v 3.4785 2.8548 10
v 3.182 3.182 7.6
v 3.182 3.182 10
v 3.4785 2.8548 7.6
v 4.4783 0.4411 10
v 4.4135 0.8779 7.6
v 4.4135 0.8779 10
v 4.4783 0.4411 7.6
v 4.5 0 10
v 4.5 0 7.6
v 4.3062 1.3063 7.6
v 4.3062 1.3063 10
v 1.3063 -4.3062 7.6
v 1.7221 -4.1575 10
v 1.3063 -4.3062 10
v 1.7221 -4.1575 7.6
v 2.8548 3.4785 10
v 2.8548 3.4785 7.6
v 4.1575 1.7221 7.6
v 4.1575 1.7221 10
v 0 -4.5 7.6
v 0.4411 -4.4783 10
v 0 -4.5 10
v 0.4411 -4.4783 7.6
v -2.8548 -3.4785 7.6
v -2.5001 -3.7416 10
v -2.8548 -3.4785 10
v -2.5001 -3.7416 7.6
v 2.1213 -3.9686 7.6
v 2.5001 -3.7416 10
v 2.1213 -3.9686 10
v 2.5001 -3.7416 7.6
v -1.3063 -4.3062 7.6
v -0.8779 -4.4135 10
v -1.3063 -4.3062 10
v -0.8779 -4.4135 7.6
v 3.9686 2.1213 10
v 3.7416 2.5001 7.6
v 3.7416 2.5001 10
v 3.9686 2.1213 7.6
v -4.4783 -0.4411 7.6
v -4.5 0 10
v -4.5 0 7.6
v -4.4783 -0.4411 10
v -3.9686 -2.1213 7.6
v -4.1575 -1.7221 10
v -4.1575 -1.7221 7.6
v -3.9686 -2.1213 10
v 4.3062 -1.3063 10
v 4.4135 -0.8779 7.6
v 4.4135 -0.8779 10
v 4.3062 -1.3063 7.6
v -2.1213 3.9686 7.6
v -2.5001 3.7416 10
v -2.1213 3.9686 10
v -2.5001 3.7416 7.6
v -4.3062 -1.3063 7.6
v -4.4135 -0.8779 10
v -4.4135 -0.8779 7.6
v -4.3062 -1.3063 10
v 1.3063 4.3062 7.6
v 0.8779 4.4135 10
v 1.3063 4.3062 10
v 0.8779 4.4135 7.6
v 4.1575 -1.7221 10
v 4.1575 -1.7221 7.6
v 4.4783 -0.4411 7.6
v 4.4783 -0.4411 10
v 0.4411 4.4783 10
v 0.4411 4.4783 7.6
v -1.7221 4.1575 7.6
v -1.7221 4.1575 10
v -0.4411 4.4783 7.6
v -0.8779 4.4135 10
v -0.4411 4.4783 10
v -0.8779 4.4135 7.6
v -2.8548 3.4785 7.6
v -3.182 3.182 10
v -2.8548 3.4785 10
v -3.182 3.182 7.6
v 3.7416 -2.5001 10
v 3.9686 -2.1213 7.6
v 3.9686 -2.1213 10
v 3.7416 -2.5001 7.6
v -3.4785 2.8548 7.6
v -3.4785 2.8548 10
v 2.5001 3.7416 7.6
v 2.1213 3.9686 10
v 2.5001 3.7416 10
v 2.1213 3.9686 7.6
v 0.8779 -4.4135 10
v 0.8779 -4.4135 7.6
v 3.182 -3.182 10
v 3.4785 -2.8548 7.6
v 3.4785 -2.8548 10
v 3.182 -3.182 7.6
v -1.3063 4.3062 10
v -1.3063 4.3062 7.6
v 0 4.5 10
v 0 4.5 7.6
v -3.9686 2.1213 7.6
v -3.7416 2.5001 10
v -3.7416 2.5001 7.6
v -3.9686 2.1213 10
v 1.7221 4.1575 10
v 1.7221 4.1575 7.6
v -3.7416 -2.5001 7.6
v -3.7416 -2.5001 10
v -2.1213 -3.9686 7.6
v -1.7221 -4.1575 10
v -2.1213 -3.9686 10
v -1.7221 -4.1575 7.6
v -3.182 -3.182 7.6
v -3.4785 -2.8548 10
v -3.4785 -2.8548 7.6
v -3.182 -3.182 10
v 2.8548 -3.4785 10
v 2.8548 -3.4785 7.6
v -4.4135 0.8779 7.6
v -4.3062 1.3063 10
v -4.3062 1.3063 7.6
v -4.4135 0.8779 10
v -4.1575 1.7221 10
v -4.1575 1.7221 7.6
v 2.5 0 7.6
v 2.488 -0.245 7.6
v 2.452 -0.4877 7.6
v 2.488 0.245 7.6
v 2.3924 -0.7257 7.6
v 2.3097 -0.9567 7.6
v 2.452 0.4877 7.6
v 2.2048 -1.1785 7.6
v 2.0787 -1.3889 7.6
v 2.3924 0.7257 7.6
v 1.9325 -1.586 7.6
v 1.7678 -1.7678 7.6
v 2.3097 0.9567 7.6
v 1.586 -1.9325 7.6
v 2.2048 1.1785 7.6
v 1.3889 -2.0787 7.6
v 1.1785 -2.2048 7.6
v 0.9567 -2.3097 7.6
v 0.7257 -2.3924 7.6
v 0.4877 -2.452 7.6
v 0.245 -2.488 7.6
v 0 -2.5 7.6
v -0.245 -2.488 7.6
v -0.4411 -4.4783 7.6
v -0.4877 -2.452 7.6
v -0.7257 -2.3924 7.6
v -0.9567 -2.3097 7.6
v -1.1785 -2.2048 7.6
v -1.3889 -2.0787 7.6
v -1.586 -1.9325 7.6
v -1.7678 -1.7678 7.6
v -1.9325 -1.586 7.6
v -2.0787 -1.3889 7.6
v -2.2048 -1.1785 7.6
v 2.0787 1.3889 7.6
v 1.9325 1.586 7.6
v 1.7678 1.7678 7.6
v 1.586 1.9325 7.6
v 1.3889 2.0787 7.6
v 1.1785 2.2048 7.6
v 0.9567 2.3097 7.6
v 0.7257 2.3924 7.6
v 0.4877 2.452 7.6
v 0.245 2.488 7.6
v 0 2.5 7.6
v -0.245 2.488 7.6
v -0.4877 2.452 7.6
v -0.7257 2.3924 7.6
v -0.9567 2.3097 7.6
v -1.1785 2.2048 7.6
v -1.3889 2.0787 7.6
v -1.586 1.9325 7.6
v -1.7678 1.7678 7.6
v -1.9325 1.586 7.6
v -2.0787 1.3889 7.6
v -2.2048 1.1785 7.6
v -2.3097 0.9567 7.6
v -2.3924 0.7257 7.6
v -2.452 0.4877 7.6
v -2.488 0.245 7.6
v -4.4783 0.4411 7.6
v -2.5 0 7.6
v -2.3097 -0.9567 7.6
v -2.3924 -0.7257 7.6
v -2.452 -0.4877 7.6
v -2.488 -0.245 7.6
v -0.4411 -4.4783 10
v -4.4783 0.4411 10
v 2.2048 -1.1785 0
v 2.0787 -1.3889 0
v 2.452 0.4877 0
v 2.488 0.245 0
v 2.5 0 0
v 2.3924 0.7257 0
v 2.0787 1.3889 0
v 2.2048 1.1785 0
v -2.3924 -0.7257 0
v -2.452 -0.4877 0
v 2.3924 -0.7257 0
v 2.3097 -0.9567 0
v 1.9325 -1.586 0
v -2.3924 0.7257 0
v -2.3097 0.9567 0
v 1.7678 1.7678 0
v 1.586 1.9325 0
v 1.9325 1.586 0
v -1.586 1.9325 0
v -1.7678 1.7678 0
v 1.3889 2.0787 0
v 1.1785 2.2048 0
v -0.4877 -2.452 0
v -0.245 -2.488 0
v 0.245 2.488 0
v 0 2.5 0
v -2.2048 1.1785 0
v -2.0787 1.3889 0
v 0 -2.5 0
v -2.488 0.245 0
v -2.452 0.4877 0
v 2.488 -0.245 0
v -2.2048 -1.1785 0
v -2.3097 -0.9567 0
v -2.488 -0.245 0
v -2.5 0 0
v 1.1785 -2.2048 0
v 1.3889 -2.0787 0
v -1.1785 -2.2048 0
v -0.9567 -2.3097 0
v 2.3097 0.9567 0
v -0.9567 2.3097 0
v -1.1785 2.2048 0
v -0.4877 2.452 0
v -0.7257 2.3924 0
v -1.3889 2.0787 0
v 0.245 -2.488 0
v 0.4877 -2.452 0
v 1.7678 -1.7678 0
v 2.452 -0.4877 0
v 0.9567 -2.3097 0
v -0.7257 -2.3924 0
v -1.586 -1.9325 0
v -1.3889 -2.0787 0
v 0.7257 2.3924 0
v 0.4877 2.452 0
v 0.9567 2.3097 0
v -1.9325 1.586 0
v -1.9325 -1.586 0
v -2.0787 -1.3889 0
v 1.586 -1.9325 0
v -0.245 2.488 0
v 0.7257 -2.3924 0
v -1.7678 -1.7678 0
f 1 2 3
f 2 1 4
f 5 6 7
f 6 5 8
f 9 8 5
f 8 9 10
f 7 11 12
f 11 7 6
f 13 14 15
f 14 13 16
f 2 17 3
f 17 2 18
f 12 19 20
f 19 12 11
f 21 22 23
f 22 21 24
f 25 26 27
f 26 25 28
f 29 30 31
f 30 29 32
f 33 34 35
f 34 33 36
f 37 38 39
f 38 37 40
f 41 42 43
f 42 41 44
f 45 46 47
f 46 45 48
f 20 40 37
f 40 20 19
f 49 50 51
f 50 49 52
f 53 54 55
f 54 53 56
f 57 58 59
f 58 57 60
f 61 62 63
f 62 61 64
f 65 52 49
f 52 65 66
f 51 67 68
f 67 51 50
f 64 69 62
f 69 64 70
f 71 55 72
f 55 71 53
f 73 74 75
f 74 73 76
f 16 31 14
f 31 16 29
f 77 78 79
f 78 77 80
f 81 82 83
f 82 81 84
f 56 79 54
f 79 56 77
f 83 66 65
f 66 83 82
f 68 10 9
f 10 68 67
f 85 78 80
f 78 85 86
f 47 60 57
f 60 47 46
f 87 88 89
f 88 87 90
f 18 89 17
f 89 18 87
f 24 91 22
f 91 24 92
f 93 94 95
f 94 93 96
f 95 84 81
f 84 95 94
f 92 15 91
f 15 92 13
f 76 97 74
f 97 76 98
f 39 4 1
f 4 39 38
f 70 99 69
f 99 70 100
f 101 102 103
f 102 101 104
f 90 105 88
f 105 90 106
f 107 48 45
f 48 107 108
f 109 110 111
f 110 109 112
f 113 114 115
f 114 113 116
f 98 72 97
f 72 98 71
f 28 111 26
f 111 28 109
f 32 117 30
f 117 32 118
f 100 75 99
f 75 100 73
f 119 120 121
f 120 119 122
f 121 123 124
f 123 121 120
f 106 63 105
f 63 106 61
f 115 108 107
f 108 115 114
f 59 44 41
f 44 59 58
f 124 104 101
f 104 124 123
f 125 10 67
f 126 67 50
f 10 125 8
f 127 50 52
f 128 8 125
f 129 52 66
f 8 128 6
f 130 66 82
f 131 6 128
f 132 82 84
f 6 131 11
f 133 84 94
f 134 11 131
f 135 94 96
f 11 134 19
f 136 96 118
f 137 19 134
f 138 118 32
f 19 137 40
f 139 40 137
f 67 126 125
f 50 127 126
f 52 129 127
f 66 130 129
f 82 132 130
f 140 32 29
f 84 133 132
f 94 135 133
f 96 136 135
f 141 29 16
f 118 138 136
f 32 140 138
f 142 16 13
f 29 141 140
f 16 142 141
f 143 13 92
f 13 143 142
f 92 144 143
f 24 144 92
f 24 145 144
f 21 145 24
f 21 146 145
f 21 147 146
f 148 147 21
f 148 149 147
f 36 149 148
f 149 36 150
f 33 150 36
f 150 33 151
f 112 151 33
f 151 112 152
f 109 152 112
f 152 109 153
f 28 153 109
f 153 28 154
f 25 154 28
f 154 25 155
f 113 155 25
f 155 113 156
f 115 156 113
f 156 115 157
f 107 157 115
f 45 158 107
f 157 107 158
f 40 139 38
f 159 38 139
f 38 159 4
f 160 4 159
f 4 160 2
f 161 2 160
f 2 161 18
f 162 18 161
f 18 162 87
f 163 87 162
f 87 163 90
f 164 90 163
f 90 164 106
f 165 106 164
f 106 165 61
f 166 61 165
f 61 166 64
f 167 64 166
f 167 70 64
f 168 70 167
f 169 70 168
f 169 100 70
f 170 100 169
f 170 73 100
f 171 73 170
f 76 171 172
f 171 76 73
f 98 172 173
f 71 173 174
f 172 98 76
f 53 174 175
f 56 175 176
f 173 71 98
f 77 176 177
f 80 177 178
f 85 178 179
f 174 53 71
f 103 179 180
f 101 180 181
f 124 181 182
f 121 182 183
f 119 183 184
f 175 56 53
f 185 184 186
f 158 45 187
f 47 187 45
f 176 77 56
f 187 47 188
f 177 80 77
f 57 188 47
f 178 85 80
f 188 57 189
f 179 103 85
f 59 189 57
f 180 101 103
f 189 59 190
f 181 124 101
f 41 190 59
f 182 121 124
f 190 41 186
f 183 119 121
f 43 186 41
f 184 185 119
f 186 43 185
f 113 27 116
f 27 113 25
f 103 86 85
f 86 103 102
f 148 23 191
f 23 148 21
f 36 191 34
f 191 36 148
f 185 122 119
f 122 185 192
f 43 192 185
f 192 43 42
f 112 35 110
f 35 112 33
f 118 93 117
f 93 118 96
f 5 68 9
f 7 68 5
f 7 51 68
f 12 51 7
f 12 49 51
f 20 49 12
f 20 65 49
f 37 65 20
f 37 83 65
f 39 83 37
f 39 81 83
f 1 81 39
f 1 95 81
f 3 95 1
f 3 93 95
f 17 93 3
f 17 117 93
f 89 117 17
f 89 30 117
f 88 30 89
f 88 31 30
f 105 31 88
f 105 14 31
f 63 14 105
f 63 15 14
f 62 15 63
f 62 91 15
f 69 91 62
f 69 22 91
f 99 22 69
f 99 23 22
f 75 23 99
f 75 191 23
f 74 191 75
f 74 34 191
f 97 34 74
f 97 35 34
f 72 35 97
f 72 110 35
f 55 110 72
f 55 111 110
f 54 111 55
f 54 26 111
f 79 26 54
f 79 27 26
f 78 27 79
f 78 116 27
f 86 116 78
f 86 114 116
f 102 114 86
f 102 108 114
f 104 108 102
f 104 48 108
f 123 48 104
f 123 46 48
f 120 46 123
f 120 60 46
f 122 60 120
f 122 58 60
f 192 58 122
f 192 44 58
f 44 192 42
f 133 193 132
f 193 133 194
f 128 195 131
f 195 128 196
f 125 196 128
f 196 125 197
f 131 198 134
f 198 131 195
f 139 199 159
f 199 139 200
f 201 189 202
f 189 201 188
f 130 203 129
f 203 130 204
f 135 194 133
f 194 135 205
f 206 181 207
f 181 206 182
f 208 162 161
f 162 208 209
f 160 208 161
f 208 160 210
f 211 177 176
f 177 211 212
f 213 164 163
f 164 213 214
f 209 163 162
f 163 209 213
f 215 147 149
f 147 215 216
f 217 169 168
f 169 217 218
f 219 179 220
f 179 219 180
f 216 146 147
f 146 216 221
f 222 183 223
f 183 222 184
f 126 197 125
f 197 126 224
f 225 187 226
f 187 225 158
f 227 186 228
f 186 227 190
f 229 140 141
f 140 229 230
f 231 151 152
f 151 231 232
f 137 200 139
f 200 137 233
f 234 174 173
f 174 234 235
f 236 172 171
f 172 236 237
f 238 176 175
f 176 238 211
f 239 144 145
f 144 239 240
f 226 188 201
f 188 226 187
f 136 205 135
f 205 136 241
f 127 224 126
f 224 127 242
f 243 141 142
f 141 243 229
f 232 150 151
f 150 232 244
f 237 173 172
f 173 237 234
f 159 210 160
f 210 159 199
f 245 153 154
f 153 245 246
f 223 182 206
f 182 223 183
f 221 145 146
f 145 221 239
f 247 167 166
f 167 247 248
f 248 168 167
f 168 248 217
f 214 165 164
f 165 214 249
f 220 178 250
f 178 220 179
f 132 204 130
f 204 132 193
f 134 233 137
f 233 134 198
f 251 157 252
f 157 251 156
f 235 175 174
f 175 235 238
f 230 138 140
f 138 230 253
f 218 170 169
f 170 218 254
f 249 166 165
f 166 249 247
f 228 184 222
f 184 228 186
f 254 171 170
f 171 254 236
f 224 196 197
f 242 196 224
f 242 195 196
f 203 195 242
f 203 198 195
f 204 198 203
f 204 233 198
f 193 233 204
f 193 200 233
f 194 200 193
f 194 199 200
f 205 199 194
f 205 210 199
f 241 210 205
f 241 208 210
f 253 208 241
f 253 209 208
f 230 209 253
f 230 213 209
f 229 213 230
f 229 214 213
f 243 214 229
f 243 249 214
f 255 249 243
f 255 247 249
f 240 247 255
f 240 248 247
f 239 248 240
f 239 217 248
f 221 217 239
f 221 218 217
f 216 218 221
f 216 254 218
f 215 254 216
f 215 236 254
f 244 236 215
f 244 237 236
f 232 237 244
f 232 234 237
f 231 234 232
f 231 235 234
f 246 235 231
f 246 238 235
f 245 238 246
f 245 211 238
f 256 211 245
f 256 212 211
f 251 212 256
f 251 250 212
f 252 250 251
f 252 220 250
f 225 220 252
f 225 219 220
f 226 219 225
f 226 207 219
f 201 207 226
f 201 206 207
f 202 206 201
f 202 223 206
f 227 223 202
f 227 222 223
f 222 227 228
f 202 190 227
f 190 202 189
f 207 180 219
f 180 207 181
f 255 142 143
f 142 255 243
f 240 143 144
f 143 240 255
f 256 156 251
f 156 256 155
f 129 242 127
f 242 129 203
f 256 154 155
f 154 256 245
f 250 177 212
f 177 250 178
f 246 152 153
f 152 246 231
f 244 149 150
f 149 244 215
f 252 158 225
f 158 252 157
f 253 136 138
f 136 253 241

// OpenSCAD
module screw() {
    union() {
        // Screw head
        translate([0, 0, 10 - 2.4])
            cylinder(h=2.4, d=9.0, $fn=64);
        
        // Screw body
        cylinder(h=10, d=5.0, $fn=64);
    }
}

screw();
